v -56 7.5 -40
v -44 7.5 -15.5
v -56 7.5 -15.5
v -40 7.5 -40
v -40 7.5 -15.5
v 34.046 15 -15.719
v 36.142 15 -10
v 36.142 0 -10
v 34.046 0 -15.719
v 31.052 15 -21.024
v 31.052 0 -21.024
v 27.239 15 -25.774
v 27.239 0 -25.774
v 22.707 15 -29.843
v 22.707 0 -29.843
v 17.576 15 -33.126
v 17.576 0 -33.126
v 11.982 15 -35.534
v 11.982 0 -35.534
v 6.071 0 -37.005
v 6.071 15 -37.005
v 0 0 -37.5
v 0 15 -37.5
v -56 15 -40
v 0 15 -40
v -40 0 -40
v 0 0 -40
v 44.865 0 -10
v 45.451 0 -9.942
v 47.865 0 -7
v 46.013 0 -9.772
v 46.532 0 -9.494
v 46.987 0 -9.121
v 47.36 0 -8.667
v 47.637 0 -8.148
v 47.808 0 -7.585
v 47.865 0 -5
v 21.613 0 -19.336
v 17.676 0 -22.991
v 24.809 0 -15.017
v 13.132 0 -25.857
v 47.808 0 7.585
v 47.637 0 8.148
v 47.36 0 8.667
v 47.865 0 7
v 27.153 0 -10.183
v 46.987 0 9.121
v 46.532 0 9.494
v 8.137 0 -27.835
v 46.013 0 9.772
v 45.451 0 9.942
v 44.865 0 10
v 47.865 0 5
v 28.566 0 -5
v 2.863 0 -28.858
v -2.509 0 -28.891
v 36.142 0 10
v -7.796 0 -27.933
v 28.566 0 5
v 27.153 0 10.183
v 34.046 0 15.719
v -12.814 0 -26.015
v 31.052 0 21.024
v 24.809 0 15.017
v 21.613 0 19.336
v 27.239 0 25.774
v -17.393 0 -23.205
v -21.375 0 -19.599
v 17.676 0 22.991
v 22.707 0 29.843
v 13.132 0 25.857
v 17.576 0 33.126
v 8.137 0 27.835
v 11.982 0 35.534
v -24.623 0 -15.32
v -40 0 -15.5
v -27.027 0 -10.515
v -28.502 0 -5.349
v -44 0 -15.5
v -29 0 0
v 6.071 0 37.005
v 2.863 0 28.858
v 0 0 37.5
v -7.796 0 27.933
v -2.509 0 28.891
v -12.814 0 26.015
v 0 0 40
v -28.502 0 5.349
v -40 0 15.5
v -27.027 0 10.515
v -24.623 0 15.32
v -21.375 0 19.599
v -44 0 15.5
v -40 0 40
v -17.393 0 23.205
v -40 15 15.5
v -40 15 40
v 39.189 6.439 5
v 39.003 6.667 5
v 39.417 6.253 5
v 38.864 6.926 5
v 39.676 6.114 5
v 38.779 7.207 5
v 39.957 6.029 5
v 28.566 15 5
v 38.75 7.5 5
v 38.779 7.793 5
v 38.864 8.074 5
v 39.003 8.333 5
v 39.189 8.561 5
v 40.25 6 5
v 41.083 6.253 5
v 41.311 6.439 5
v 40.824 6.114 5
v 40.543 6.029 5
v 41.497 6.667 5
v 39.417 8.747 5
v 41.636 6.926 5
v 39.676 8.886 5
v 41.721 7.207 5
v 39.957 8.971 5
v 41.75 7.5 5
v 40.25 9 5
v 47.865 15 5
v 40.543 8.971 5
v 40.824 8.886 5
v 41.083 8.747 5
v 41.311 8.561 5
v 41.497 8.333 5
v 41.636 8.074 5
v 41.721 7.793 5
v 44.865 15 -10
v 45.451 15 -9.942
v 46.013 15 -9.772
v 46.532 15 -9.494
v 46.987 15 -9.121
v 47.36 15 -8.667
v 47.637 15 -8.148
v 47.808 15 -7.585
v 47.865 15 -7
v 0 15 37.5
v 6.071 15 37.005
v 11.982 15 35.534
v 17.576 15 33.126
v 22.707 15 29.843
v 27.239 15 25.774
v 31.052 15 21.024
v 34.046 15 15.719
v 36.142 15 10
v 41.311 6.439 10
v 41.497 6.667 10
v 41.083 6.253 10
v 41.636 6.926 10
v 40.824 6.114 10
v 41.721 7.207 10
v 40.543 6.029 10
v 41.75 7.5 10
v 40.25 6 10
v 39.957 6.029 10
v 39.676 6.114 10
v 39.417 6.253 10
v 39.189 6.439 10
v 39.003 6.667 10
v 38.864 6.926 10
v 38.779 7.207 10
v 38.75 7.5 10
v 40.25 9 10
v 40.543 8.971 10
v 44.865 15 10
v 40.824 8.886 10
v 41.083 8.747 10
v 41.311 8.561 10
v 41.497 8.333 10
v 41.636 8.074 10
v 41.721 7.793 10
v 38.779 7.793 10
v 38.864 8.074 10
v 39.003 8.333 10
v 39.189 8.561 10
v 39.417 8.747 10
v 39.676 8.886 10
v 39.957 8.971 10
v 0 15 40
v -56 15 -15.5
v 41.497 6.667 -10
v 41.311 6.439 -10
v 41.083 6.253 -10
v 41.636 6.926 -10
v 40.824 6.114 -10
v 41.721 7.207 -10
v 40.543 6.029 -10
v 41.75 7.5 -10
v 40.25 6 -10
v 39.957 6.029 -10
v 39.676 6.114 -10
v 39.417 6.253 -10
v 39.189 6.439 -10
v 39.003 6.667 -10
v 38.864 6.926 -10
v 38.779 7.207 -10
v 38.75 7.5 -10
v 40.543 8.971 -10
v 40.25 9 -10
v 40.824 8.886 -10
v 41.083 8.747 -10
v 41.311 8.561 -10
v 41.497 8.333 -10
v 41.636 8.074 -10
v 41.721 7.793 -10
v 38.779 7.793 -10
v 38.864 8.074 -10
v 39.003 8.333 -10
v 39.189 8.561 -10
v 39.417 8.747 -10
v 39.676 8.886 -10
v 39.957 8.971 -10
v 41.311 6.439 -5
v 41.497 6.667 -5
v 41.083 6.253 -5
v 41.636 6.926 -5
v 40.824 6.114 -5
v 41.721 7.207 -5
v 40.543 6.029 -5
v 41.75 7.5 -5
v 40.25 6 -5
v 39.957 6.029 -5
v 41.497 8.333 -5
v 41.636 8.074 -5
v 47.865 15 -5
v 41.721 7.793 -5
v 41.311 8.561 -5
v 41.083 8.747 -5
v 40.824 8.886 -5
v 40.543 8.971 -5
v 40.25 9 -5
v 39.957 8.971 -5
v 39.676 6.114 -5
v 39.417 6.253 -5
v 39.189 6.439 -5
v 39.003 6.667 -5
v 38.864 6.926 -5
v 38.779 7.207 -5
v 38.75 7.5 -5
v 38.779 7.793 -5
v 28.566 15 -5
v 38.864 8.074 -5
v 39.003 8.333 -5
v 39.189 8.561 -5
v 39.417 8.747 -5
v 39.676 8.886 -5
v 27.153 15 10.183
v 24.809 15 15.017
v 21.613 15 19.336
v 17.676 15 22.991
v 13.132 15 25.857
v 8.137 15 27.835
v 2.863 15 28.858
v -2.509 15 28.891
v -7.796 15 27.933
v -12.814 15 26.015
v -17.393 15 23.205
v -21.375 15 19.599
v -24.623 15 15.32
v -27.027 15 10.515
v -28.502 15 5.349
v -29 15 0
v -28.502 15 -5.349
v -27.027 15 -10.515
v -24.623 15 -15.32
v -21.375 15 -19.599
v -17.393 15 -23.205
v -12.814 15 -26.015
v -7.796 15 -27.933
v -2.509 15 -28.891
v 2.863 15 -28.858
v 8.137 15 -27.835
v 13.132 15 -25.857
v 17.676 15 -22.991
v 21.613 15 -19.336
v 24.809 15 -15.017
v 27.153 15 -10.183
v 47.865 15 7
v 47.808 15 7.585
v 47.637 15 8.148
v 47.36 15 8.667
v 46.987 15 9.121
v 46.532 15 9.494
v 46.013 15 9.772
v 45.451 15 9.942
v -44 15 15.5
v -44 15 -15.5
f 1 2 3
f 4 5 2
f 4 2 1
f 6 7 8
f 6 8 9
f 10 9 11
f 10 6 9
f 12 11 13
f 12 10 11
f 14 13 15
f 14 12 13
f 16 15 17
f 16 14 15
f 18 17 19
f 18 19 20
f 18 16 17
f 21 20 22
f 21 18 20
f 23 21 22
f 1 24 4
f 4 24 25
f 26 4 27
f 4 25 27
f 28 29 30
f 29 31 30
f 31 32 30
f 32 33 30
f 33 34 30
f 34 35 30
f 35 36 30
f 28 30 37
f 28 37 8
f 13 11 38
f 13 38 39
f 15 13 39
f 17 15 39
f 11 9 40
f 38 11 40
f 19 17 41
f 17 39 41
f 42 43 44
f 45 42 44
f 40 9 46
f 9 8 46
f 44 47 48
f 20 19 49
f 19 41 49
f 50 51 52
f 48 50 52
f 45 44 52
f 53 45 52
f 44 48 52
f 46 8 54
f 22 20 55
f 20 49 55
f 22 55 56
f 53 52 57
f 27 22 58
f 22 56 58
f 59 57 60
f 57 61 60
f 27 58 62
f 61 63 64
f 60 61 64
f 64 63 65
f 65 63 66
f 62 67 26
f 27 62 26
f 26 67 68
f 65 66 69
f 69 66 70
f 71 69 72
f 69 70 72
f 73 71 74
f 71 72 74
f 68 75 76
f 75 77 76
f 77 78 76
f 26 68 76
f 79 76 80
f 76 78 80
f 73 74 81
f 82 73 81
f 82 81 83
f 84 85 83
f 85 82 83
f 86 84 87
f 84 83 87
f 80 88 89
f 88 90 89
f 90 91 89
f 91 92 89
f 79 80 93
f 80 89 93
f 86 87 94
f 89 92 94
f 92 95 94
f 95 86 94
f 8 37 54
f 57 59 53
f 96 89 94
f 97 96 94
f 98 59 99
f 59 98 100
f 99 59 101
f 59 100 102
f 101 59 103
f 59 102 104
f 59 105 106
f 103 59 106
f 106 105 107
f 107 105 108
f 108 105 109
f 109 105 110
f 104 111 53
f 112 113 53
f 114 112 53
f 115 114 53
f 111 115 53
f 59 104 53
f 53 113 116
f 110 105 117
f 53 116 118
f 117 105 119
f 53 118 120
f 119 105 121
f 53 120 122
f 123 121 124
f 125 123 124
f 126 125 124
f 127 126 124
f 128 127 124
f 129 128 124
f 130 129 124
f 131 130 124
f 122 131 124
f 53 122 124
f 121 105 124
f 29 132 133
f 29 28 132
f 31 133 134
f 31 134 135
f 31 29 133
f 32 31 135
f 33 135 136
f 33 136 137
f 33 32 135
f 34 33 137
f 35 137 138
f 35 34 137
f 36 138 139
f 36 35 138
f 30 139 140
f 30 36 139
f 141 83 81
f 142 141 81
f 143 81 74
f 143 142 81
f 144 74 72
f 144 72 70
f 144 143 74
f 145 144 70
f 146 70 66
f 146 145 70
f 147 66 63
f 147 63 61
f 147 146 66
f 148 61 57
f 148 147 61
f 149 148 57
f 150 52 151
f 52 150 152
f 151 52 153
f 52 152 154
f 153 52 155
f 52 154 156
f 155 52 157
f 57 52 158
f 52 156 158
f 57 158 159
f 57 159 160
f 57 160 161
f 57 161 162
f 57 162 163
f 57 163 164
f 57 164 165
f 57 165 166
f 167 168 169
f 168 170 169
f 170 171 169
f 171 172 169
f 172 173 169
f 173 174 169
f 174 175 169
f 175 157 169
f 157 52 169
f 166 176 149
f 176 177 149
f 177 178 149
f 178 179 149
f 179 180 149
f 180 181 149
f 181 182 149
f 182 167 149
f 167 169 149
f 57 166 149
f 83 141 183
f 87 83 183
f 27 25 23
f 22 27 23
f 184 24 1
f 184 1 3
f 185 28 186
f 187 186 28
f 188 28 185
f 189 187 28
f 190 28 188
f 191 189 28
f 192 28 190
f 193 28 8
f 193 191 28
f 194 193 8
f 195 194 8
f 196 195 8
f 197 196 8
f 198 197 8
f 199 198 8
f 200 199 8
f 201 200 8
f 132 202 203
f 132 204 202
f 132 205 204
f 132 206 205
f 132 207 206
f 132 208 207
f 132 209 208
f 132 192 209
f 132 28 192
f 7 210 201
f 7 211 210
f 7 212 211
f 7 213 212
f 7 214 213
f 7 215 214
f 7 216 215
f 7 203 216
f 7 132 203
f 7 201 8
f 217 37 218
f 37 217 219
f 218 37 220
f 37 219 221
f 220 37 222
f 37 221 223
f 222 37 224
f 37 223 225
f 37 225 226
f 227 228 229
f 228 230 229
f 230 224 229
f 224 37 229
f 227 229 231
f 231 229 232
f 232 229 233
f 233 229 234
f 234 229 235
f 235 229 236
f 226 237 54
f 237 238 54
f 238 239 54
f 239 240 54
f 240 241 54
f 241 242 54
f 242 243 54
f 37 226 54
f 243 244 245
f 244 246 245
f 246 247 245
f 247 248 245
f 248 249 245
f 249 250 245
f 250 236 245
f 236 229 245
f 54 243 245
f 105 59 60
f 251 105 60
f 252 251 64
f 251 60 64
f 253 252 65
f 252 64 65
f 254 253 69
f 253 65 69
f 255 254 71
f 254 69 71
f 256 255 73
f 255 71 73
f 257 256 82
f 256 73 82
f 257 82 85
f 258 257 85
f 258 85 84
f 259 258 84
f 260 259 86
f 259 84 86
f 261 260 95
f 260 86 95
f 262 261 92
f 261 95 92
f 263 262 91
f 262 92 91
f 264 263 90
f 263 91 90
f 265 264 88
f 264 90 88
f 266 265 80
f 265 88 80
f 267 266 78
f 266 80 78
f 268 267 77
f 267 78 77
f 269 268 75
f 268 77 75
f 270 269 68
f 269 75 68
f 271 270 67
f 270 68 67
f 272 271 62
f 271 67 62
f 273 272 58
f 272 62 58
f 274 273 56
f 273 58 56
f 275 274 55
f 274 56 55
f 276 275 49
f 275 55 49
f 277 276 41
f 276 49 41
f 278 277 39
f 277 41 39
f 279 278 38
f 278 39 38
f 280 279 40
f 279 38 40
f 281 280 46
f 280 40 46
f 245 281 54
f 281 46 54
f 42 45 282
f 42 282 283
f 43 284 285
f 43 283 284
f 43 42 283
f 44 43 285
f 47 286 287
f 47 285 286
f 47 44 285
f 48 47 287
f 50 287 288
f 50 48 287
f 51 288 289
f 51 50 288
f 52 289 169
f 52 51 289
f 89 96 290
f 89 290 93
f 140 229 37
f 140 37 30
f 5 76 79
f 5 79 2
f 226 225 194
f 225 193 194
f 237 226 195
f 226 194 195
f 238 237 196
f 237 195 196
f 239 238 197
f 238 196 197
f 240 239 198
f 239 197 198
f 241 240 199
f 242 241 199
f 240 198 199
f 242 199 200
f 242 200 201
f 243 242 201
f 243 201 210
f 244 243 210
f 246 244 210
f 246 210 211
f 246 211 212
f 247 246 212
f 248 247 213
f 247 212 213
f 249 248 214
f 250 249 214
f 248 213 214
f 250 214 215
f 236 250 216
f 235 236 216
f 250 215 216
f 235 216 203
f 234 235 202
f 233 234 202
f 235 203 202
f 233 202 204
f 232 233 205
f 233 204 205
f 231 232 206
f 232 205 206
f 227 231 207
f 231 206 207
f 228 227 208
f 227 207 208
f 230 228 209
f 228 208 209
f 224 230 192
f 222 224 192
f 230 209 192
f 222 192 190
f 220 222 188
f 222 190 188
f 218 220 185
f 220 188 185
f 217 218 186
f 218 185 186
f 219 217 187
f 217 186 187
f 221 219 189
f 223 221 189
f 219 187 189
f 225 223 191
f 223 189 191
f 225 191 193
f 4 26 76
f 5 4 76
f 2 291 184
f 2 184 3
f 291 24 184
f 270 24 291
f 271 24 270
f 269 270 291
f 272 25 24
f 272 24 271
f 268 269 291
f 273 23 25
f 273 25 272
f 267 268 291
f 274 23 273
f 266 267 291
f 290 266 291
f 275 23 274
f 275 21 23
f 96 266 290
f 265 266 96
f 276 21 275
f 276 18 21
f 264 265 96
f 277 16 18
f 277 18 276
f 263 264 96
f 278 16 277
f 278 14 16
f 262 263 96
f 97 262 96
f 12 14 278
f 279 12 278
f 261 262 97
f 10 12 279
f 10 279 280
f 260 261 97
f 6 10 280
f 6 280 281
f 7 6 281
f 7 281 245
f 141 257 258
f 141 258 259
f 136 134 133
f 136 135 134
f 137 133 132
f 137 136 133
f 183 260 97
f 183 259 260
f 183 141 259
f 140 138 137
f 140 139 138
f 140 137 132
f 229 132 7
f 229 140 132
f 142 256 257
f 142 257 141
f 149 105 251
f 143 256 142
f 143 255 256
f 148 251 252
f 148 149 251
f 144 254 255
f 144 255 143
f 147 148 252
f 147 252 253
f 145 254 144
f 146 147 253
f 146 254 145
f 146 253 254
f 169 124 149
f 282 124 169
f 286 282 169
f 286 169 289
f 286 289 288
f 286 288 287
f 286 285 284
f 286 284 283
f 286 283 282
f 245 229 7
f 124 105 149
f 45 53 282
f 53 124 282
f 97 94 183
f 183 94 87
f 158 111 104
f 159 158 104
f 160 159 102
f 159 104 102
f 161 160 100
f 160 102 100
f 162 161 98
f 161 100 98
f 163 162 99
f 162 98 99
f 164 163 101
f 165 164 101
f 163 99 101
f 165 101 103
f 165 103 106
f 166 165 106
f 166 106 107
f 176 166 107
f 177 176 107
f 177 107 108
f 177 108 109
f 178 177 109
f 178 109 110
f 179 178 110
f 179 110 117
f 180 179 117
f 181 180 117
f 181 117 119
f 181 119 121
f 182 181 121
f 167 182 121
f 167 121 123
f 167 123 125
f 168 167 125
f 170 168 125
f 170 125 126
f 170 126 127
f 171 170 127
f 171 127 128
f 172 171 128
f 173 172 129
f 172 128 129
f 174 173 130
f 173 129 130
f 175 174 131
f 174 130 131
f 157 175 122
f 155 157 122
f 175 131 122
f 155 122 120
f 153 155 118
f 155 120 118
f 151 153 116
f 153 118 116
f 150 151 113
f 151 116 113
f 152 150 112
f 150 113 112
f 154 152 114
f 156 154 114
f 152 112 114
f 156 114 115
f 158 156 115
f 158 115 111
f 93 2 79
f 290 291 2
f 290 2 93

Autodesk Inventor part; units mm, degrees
ref_plane "YZ Plane" through (0, 0, 0) normal (1, 0, 0) x (0, 1, 0)
ref_plane "XZ Plane" through (0, 0, 0) normal (0, 1, 0) x (-1, 0, 0)
ref_plane "XY Plane" through (0, 0, 0) normal (0, 0, 1) x (1, 0, 0)
sketch "Sketch1" plane through (0, 0, 0) normal (0, 1, 0) x (-1, 0, 0)
  line L0 (-40, -40) -> (40, -40)
  line L1 (40, -40) -> (40, 40)
  line L2 (40, 40) -> (-40, 40)
  line L3 (-40, 40) -> (-40, -40)
  line L4 (-40, -40) -> (40, 40) construction
  line L5 (40, -40) -> (-40, 40) construction
  point P0 (0, 0)
  dimension "d0" = 80
  dimension "d1" = 80
extrude "Extrusion1" add sketch "Sketch1" along normal blind 15
sketch "Sketch2" plane through (0, 15, 0) normal (0, 1, 0) x (1, 0, 0)
  point P0 (0, 0)
  point P1 (0, 0)
hole "Hole1" at (0, 15, 0) direction (0, -1, 0) diameter 58 end through all
sketch "Sketch3" plane through (0, 15, 0) normal (0, 1, 0) x (1, 0, 0)
  arc A0 (0, -37.5) -> (0, 37.5) centre (0, 0) ccw
  line L0 (-40, -40) -> (40, -40) projected
  line L1 (40, -40) -> (40, 40) projected
  line L2 (0, -40) -> (40, -40)
  line L3 (40, -40) -> (40, 40)
  line L4 (40, 40) -> (0, 40)
  line L5 (0, 40) -> (0, 37.5)
  line L6 (0, -37.5) -> (0, -40)
  dimension "d11" = 75
extrude "Extrusion2" cut sketch "Sketch3" against normal through all
sketch "Sketch4" plane through (0, 15, 0) normal (0, 1, 0) x (1, 0, 0)
  line L0 (41.8017, 5) -> (26.6036, 5)
  line L1 (26.6036, 5) -> (26.6036, -5)
  line L2 (26.6036, -5) -> (41.8017, -5)
  line L3 (41.8017, -5) -> (41.8017, 5)
  line L4 (41.8017, 5) -> (26.6036, -5) construction
  line L5 (26.6036, 5) -> (41.8017, -5) construction
  point P0 (0, 0)
  point P1 (34.2027, 0)
  dimension "d14" = 10
extrude "Extrusion3" cut sketch "Sketch4" against normal through all
sketch "Sketch5" plane through (0, 15, 0) normal (0, 1, 0) x (1, 0, 0)
  line L0 (28.5657, -5) -> (37.1652, -5) projected
  line L1 (32.8654, -5) -> (47.8654, -5)
  line L2 (47.8654, -5) -> (47.8654, -10)
  line L3 (47.8654, -10) -> (32.8654, -10)
  line L4 (32.8654, -10) -> (32.8654, -5)
  line L5 (25.4496, 0) -> (55.494, 0)
  line L6 (28.5657, 5) -> (37.1652, 5)
  line L7 (32.8654, 5) -> (47.8654, 5)
  line L8 (47.8654, 5) -> (47.8654, 10)
  line L9 (47.8654, 10) -> (32.8654, 10)
  line L10 (32.8654, 10) -> (32.8654, 5)
  point P0 (0, 0)
  dimension "d17" = 15
  dimension "d18" = 5
extrude "Extrusion4" add sketch "Sketch5" against normal blind 15
fillet "Fillet1" radius 3 2 edges at (47.8654, 7.5, 10) (47.8654, 7.5, -10)
sketch "Sketch6" plane through (36.1421, 0, 10) normal (0, 0, 1) x (1, 0, 0)
  line L0 (8.7234, 15) -> (8.7234, 0) projected
  point P0 (-36.1421, 0)
  point P1 (4.1079, 7.5)
  dimension "d22" = 4.6155
hole "Hole2" at (40.2499, 7.5, 10) direction (0, 0, -1) diameter 3 end through all
sketch "Sketch7" plane through (-40, 0, -40) normal (-1, 0, 0) x (0, 0, 1)
  line L0 (30, 15) -> (2.5, 15) projected
  line L1 (0, 0) -> (80, 0) projected
  line L2 (24.5, 15) -> (55.5, 15)
  line L3 (55.5, 15) -> (55.5, 0)
  line L4 (55.5, 0) -> (24.5, 0)
  line L5 (24.5, 0) -> (24.5, 15)
  line L6 (0, 0) -> (0, 15) projected
  point P0 (40, 0)
  dimension "d30" = 31
  dimension "d31" = 24.5
extrude "Extrusion5" add sketch "Sketch7" along normal blind 4
sketch "Sketch8" plane through (-40, 0, -40) normal (-1, 0, 0) x (0, 0, 1)
  line L0 (0, 15) -> (0, 0) projected
  line L1 (24.5, 15) -> (24.5, 0) projected
  line L2 (0, 15) -> (24.5, 15)
  line L3 (24.5, 15) -> (24.5, 7.5)
  line L4 (24.5, 7.5) -> (0, 7.5)
  line L5 (0, 7.5) -> (0, 15)
  point P0 (40, 0)
  dimension "d34" = 7.5
extrude "Extrusion6" add sketch "Sketch8" along normal blind 16
properties part number "Clamp" material "PC/ABS Plastic"
